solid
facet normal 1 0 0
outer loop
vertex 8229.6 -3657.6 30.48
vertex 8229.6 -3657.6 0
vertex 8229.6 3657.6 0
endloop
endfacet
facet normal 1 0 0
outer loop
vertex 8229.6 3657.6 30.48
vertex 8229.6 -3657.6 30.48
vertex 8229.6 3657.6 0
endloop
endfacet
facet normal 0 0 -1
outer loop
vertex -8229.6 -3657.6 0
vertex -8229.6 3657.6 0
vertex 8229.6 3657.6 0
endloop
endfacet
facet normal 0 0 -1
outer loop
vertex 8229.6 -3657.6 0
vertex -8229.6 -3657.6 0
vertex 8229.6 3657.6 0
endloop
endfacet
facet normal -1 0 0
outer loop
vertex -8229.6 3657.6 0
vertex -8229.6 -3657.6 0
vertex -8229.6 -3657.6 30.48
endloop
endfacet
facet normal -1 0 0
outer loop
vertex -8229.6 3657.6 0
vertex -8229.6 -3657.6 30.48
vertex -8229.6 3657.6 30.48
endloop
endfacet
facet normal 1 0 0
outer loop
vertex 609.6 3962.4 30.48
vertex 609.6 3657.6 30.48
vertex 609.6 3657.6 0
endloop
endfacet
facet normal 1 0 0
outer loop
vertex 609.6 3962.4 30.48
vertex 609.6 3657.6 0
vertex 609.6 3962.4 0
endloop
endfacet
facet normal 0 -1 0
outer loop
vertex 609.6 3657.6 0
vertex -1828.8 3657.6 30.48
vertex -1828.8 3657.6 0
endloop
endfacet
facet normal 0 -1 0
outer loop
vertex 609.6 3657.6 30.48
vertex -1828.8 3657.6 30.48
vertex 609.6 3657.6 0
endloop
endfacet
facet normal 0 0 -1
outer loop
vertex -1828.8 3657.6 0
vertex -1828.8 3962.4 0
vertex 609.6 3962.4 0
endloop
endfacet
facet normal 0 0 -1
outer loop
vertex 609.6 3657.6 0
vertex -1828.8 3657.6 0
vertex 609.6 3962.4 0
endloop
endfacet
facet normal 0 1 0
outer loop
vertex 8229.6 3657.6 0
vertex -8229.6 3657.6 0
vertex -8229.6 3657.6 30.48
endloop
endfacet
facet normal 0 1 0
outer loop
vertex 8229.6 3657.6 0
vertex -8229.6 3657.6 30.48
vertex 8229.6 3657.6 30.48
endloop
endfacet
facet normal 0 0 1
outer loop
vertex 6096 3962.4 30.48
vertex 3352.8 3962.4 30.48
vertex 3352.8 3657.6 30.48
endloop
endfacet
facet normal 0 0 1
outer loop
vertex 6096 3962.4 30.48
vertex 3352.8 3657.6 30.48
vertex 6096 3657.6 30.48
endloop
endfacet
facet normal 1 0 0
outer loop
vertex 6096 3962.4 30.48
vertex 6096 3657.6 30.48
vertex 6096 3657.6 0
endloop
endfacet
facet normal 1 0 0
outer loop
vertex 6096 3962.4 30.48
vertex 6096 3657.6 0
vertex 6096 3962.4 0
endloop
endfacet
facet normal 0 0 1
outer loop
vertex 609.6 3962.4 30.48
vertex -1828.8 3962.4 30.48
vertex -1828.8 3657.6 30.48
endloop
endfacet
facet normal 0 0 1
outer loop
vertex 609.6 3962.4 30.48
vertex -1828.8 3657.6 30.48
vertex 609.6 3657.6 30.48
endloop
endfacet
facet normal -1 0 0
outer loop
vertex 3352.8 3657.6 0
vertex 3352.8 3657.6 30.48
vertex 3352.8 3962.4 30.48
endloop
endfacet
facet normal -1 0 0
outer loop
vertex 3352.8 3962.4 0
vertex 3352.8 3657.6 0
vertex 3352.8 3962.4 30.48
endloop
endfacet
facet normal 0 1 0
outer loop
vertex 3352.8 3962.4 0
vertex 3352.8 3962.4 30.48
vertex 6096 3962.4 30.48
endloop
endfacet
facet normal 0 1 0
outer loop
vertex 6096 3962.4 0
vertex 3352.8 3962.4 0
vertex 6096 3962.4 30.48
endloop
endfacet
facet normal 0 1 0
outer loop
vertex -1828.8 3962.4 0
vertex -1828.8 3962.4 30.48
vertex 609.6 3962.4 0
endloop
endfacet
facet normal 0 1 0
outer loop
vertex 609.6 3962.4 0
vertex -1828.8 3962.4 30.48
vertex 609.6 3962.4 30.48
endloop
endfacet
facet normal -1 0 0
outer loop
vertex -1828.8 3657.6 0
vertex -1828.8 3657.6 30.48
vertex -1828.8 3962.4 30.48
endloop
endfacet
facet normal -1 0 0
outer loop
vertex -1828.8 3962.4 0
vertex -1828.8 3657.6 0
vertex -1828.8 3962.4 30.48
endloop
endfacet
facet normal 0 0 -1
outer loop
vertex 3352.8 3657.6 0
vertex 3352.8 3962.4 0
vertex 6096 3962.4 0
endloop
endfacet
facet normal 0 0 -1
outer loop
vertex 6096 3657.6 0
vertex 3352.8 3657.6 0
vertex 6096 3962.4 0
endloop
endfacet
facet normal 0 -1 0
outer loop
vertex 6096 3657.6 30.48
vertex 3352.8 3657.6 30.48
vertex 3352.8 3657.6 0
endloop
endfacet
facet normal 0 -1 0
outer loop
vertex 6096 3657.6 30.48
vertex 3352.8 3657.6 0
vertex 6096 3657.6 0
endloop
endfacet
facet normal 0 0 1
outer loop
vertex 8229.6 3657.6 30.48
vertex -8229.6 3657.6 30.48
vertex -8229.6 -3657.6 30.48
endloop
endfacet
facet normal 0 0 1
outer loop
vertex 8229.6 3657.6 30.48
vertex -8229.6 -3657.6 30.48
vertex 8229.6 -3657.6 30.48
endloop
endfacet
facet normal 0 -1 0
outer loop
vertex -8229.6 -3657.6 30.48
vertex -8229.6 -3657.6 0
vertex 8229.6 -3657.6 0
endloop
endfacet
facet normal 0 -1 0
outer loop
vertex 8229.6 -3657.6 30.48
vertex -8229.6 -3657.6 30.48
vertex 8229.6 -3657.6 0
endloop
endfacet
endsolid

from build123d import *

# Parameters (mm, degrees)
F0_W     = 16459.2
F0_H     = 7315.2
F1_DEPTH = 30.48
F2_W     = 2438.4
F2_H     = 304.8
F2_W_2   = 2743.2
F3_DEPTH = 30.48


with BuildPart() as f1:
    # F0 (on Top) → F1 (new body)
    with BuildSketch(Plane.XY):
        Rectangle(F0_W, F0_H)
    extrude(amount=F1_DEPTH)


with BuildPart() as f3:
    # F2 (on face) → F3 (new body)
    with BuildSketch(Plane.XY.offset(30.48)):
        with Locations((-609.6, 3810)):
            Rectangle(F2_W, F2_H)
        with Locations((4724.4, 3810)):
            Rectangle(F2_W_2, F2_H)
    extrude(amount=-F3_DEPTH)


solid = Compound([f1.part, f3.part])
